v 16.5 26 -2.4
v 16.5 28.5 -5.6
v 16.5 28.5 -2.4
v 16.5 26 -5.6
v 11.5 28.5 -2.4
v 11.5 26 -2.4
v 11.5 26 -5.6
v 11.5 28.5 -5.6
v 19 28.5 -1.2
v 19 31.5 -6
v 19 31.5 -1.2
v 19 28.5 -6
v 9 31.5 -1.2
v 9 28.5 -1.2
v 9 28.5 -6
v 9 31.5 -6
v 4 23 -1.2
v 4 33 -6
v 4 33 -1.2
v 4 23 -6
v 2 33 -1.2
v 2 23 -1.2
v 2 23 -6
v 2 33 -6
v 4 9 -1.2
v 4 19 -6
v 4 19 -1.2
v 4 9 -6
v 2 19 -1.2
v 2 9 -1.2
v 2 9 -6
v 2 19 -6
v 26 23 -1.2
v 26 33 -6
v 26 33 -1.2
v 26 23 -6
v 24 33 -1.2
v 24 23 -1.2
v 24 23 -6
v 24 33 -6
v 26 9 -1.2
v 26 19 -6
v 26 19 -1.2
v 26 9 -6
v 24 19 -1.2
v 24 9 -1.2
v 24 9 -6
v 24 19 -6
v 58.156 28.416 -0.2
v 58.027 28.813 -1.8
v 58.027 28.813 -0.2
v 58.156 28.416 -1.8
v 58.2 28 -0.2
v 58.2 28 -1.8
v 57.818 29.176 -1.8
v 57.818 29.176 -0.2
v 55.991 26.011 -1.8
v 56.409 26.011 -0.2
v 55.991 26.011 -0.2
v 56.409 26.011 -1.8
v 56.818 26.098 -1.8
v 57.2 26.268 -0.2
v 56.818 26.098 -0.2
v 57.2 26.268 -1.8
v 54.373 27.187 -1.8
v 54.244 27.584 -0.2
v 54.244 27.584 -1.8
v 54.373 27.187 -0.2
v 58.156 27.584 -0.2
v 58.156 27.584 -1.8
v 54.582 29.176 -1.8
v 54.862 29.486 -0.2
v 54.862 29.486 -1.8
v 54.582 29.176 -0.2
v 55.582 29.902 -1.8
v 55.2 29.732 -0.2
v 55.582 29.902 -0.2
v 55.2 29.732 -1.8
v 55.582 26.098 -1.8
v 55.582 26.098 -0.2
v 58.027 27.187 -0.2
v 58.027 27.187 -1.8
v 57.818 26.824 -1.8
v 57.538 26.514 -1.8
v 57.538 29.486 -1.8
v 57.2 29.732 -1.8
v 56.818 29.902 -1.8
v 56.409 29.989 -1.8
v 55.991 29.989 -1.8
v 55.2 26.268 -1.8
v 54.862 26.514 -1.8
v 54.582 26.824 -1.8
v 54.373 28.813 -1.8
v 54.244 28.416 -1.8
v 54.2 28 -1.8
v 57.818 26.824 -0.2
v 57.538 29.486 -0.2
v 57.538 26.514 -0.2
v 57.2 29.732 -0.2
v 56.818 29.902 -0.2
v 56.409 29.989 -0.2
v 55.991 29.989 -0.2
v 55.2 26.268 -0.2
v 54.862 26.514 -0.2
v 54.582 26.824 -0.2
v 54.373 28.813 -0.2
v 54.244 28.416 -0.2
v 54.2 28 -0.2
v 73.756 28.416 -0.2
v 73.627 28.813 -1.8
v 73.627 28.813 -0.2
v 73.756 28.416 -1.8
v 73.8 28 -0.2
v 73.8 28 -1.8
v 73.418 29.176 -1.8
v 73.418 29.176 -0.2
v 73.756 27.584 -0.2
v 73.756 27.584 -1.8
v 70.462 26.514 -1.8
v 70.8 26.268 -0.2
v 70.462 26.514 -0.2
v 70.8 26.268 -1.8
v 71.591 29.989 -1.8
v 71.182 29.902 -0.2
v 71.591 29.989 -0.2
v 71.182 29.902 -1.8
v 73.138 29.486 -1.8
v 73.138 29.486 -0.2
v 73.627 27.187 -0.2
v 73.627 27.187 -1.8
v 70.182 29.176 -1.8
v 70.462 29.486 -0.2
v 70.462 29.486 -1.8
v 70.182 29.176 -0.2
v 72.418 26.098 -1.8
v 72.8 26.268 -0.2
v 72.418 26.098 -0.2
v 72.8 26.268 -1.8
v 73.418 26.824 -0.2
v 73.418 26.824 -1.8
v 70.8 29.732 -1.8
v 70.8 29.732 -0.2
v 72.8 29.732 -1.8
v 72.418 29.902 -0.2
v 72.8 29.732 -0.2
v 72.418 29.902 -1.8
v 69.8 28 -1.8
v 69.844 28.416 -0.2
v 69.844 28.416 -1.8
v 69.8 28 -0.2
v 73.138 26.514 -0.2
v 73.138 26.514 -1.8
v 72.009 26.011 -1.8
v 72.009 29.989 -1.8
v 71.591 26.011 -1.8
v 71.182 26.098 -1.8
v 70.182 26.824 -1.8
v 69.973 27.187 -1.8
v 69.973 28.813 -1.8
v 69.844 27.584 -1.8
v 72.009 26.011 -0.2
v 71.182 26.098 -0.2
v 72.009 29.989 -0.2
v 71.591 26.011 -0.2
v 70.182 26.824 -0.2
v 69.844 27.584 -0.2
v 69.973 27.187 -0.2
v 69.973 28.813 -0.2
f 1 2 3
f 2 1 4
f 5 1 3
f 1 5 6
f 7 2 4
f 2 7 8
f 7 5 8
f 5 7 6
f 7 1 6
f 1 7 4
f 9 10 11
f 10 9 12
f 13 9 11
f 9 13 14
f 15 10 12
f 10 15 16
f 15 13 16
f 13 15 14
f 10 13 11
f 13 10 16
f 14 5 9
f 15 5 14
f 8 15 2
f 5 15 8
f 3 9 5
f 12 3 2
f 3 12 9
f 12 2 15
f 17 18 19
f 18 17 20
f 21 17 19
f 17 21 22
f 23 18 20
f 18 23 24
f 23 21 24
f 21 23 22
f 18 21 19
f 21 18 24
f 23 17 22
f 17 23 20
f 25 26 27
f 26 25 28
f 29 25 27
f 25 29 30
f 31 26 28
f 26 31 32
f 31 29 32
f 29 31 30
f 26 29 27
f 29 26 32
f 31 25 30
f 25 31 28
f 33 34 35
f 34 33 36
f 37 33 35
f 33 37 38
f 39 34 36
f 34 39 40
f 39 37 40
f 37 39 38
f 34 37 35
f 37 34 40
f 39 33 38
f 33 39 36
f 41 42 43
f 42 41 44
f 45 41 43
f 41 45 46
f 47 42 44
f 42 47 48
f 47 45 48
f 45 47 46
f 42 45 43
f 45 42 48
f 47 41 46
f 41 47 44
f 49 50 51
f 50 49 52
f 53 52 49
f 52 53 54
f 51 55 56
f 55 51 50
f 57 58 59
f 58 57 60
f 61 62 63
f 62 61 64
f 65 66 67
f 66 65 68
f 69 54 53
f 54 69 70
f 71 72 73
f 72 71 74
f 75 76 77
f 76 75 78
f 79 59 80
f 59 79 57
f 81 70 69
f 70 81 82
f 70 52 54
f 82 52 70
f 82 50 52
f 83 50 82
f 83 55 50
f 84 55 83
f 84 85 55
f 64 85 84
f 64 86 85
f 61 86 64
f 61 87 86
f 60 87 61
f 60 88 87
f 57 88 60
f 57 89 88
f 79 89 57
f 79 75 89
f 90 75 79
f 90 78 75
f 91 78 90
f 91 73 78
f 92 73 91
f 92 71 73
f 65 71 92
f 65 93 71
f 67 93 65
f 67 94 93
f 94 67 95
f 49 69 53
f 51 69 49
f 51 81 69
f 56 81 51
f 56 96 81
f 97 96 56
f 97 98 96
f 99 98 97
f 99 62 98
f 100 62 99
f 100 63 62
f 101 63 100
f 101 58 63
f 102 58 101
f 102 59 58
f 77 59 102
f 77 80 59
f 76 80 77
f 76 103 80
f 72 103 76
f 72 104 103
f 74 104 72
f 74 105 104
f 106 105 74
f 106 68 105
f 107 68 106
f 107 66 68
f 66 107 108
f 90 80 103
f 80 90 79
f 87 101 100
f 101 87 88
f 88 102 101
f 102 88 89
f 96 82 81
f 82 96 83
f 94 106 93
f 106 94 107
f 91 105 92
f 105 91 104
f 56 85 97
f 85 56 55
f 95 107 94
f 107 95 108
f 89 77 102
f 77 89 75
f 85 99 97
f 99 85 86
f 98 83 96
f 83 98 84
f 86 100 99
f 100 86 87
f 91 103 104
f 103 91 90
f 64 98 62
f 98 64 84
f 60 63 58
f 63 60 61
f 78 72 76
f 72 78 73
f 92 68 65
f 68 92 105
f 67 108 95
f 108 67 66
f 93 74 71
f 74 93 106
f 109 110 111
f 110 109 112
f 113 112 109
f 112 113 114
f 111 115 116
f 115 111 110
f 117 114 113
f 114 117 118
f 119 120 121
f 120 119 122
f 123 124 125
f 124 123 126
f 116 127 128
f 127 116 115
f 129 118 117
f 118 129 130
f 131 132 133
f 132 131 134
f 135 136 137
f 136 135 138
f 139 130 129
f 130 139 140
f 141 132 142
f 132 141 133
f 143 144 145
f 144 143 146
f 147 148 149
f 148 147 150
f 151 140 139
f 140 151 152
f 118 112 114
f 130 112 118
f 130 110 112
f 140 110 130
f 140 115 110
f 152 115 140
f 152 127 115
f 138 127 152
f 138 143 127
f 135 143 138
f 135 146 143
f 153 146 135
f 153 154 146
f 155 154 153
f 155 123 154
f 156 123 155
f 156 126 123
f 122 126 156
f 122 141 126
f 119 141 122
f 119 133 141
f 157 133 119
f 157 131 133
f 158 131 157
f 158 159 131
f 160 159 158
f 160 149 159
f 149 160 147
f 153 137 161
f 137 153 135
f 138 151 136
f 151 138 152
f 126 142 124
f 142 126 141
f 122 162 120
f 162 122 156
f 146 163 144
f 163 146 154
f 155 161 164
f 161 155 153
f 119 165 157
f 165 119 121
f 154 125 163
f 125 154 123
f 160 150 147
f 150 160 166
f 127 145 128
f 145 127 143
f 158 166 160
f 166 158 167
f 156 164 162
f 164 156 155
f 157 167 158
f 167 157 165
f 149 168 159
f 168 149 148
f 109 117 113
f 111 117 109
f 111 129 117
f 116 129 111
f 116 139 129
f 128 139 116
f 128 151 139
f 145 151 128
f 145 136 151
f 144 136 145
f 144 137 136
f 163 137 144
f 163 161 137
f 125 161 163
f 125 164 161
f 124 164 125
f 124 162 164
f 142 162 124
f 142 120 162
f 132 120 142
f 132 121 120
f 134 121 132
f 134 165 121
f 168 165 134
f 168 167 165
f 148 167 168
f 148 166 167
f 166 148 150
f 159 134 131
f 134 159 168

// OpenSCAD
//14 9
WallHeight = 12;
BaseHeight = 1.6;

 Body();
 Cover();


 module Cover(){
difference(){
translate([50,0,1+BaseHeight-WallHeight/2]) caseCover();
    translate([50,0,0]) linear_extrude(height = BaseHeight*8, center = true, convexity = 10, twist = 0) import("TinyCase_TopCut2.dxf", convexity=3);
    translate([50,0,-1.6]) linear_extrude(height = BaseHeight, center = true, convexity = 10, twist = 0) import("TinyCase_TopCut.dxf", convexity=3);
  translate([64,42,1.6]) rotate([90, 0, 0])  cube([8, 8, ,30], center=true);    

  }
}
 module caseCover(){
  linear_extrude(height = 2.6, center = false, convexity = 10, twist = 0) import("TinyCase_cover.dxf", convexity=3);
  
  translate([0,0,0]) linear_extrude(height = BaseHeight-0.2, center = false, convexity = 10, twist = 0) import("TinyCase_base.dxf", convexity=3);
    
 translate([6.2,28,-3.6+WallHeight/2]) cylinder(h=1.6, r=2, center=true, $fn=30);
 translate([21.8,28,-3.6+WallHeight/2]) cylinder(h=1.6, r=2, center=true, $fn=30);
     
 }

 module Body(){
difference(){
    caseBody();
    //USB-C plug
    translate([14,3,1.2+BaseHeight-WallHeight/2]) cube([9,12,4],true);
    //audio-Jack
    translate([14,36,-3.6+WallHeight/2]) rotate([90, 0, 0]) cylinder(h=20, r=3, center=true, $fn=30);
    //side-port
    translate([26,16,-3.6+WallHeight/2]) cube([10,8,4],true);
}   
}
    
   
 module caseBody(){
  linear_extrude(height = WallHeight, center = true, convexity = 10, twist = 0) import("TinyCase_wall.dxf", convexity=3);
  
  translate([0,0,BaseHeight/2-WallHeight/2]) linear_extrude(height = BaseHeight, center = true, convexity = 10, twist = 0) import("TinyCase_base.dxf", convexity=3);
     
  translate([14,28,0.4+BaseHeight-WallHeight/2]) cube([5,4,3.2],true);
  translate([14,30,0.8+BaseHeight-WallHeight/2]) cube([10,3,4.8],true);
     
  translate([3,28,0.8+BaseHeight-WallHeight/2]) cube([2,10,4.8],true);
  translate([3,14,0.8+BaseHeight-WallHeight/2]) cube([2,10,4.8],true);
  translate([25,28,0.8+BaseHeight-WallHeight/2]) cube([2,10,4.8],true);
  translate([25,14,0.8+BaseHeight-WallHeight/2]) cube([2,10,4.8],true);
 }
 

 
 
